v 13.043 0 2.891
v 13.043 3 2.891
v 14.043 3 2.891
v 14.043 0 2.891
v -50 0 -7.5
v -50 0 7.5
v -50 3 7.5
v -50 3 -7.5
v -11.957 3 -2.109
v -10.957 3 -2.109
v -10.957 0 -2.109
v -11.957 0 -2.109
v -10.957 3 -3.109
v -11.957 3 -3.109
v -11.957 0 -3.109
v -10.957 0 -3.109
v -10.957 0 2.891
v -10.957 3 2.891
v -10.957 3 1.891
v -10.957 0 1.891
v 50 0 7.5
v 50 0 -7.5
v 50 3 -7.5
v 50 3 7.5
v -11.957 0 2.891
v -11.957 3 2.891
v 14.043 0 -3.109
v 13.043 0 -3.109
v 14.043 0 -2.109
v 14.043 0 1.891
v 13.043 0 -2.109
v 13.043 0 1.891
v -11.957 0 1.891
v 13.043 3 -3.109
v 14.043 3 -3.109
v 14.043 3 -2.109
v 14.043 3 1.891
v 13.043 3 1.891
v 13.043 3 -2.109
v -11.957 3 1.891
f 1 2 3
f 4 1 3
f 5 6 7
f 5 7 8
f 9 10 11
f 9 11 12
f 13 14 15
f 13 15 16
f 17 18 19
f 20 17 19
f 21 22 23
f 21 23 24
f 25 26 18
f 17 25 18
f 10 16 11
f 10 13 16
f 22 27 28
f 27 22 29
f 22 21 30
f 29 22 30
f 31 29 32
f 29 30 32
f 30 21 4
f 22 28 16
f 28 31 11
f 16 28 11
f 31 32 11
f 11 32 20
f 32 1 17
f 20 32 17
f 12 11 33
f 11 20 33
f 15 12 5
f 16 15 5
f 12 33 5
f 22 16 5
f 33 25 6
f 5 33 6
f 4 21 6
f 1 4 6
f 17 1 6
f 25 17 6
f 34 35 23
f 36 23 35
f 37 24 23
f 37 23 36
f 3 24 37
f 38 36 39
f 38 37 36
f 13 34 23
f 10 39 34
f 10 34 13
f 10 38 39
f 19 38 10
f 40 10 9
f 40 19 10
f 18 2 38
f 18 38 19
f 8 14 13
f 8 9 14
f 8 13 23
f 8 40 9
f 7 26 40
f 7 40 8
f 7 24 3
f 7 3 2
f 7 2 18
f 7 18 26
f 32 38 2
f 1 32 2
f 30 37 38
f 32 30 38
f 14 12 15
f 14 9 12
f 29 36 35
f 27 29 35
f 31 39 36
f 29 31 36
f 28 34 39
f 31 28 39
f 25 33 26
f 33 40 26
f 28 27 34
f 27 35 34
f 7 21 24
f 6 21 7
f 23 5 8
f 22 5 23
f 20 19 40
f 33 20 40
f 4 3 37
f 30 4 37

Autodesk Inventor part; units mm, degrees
ref_plane "YZ Plane" through (0, 0, 0) normal (1, 0, 0) x (0, 1, 0)
ref_plane "XZ Plane" through (0, 0, 0) normal (0, 1, 0) x (-1, 0, 0)
ref_plane "XY Plane" through (0, 0, 0) normal (0, 0, 1) x (1, 0, 0)
sketch "Sketch1" plane through (0, 0, 0) normal (0, 1, 0) x (-1, 0, 0)
  line L0 (-50, 7.5) -> (50, 7.5)
  line L1 (50, 7.5) -> (50, -7.5)
  line L2 (50, -7.5) -> (-50, -7.5)
  line L3 (-50, -7.5) -> (-50, 7.5)
  point P0 (0, 0)
  dimension "d2" = 100
  dimension "d3" = 15
extrude "Extrusion1" add sketch "Sketch1" along normal blind 3
sketch "Sketch2" plane through (0, 0, 0) normal (0, -1, 0) x (1, 0, 0)
  line L0 (13.0431, 2.8913) -> (14.0431, 2.8913)
  line L1 (14.0431, 2.8913) -> (14.0431, 1.8913)
  line L2 (14.0431, 1.8913) -> (13.0431, 1.8913)
  line L3 (13.0431, 1.8913) -> (13.0431, 2.8913)
  line L4 (13.0431, -2.1087) -> (14.0431, -2.1087)
  line L5 (14.0431, -2.1087) -> (14.0431, -3.1087)
  line L6 (14.0431, -3.1087) -> (13.0431, -3.1087)
  line L7 (13.0431, -3.1087) -> (13.0431, -2.1087)
  line L8 (-10.9569, 1.8913) -> (-11.9569, 1.8913)
  line L9 (-11.9569, 1.8913) -> (-11.9569, 2.8913)
  line L10 (-11.9569, 2.8913) -> (-10.9569, 2.8913)
  line L11 (-10.9569, 2.8913) -> (-10.9569, 1.8913)
  line L12 (-10.9569, -2.1087) -> (-11.9569, -2.1087)
  line L13 (-11.9569, -2.1087) -> (-11.9569, -3.1087)
  line L14 (-11.9569, -3.1087) -> (-10.9569, -3.1087)
  line L15 (-10.9569, -3.1087) -> (-10.9569, -2.1087)
  point P0 (0, 0)
  dimension "d7" = 1
  dimension "d8" = 4
  dimension "d9" = 1
  dimension "d10" = 1
  dimension "d11" = 24
  dimension "d12" = 1
  dimension "d13" = 1
  dimension "d14" = 4
  dimension "d15" = 1
  dimension "d16" = 1
extrude "Extrusion2" cut sketch "Sketch2" along normal mid plane 10
properties part number "Placa do Circuito"
